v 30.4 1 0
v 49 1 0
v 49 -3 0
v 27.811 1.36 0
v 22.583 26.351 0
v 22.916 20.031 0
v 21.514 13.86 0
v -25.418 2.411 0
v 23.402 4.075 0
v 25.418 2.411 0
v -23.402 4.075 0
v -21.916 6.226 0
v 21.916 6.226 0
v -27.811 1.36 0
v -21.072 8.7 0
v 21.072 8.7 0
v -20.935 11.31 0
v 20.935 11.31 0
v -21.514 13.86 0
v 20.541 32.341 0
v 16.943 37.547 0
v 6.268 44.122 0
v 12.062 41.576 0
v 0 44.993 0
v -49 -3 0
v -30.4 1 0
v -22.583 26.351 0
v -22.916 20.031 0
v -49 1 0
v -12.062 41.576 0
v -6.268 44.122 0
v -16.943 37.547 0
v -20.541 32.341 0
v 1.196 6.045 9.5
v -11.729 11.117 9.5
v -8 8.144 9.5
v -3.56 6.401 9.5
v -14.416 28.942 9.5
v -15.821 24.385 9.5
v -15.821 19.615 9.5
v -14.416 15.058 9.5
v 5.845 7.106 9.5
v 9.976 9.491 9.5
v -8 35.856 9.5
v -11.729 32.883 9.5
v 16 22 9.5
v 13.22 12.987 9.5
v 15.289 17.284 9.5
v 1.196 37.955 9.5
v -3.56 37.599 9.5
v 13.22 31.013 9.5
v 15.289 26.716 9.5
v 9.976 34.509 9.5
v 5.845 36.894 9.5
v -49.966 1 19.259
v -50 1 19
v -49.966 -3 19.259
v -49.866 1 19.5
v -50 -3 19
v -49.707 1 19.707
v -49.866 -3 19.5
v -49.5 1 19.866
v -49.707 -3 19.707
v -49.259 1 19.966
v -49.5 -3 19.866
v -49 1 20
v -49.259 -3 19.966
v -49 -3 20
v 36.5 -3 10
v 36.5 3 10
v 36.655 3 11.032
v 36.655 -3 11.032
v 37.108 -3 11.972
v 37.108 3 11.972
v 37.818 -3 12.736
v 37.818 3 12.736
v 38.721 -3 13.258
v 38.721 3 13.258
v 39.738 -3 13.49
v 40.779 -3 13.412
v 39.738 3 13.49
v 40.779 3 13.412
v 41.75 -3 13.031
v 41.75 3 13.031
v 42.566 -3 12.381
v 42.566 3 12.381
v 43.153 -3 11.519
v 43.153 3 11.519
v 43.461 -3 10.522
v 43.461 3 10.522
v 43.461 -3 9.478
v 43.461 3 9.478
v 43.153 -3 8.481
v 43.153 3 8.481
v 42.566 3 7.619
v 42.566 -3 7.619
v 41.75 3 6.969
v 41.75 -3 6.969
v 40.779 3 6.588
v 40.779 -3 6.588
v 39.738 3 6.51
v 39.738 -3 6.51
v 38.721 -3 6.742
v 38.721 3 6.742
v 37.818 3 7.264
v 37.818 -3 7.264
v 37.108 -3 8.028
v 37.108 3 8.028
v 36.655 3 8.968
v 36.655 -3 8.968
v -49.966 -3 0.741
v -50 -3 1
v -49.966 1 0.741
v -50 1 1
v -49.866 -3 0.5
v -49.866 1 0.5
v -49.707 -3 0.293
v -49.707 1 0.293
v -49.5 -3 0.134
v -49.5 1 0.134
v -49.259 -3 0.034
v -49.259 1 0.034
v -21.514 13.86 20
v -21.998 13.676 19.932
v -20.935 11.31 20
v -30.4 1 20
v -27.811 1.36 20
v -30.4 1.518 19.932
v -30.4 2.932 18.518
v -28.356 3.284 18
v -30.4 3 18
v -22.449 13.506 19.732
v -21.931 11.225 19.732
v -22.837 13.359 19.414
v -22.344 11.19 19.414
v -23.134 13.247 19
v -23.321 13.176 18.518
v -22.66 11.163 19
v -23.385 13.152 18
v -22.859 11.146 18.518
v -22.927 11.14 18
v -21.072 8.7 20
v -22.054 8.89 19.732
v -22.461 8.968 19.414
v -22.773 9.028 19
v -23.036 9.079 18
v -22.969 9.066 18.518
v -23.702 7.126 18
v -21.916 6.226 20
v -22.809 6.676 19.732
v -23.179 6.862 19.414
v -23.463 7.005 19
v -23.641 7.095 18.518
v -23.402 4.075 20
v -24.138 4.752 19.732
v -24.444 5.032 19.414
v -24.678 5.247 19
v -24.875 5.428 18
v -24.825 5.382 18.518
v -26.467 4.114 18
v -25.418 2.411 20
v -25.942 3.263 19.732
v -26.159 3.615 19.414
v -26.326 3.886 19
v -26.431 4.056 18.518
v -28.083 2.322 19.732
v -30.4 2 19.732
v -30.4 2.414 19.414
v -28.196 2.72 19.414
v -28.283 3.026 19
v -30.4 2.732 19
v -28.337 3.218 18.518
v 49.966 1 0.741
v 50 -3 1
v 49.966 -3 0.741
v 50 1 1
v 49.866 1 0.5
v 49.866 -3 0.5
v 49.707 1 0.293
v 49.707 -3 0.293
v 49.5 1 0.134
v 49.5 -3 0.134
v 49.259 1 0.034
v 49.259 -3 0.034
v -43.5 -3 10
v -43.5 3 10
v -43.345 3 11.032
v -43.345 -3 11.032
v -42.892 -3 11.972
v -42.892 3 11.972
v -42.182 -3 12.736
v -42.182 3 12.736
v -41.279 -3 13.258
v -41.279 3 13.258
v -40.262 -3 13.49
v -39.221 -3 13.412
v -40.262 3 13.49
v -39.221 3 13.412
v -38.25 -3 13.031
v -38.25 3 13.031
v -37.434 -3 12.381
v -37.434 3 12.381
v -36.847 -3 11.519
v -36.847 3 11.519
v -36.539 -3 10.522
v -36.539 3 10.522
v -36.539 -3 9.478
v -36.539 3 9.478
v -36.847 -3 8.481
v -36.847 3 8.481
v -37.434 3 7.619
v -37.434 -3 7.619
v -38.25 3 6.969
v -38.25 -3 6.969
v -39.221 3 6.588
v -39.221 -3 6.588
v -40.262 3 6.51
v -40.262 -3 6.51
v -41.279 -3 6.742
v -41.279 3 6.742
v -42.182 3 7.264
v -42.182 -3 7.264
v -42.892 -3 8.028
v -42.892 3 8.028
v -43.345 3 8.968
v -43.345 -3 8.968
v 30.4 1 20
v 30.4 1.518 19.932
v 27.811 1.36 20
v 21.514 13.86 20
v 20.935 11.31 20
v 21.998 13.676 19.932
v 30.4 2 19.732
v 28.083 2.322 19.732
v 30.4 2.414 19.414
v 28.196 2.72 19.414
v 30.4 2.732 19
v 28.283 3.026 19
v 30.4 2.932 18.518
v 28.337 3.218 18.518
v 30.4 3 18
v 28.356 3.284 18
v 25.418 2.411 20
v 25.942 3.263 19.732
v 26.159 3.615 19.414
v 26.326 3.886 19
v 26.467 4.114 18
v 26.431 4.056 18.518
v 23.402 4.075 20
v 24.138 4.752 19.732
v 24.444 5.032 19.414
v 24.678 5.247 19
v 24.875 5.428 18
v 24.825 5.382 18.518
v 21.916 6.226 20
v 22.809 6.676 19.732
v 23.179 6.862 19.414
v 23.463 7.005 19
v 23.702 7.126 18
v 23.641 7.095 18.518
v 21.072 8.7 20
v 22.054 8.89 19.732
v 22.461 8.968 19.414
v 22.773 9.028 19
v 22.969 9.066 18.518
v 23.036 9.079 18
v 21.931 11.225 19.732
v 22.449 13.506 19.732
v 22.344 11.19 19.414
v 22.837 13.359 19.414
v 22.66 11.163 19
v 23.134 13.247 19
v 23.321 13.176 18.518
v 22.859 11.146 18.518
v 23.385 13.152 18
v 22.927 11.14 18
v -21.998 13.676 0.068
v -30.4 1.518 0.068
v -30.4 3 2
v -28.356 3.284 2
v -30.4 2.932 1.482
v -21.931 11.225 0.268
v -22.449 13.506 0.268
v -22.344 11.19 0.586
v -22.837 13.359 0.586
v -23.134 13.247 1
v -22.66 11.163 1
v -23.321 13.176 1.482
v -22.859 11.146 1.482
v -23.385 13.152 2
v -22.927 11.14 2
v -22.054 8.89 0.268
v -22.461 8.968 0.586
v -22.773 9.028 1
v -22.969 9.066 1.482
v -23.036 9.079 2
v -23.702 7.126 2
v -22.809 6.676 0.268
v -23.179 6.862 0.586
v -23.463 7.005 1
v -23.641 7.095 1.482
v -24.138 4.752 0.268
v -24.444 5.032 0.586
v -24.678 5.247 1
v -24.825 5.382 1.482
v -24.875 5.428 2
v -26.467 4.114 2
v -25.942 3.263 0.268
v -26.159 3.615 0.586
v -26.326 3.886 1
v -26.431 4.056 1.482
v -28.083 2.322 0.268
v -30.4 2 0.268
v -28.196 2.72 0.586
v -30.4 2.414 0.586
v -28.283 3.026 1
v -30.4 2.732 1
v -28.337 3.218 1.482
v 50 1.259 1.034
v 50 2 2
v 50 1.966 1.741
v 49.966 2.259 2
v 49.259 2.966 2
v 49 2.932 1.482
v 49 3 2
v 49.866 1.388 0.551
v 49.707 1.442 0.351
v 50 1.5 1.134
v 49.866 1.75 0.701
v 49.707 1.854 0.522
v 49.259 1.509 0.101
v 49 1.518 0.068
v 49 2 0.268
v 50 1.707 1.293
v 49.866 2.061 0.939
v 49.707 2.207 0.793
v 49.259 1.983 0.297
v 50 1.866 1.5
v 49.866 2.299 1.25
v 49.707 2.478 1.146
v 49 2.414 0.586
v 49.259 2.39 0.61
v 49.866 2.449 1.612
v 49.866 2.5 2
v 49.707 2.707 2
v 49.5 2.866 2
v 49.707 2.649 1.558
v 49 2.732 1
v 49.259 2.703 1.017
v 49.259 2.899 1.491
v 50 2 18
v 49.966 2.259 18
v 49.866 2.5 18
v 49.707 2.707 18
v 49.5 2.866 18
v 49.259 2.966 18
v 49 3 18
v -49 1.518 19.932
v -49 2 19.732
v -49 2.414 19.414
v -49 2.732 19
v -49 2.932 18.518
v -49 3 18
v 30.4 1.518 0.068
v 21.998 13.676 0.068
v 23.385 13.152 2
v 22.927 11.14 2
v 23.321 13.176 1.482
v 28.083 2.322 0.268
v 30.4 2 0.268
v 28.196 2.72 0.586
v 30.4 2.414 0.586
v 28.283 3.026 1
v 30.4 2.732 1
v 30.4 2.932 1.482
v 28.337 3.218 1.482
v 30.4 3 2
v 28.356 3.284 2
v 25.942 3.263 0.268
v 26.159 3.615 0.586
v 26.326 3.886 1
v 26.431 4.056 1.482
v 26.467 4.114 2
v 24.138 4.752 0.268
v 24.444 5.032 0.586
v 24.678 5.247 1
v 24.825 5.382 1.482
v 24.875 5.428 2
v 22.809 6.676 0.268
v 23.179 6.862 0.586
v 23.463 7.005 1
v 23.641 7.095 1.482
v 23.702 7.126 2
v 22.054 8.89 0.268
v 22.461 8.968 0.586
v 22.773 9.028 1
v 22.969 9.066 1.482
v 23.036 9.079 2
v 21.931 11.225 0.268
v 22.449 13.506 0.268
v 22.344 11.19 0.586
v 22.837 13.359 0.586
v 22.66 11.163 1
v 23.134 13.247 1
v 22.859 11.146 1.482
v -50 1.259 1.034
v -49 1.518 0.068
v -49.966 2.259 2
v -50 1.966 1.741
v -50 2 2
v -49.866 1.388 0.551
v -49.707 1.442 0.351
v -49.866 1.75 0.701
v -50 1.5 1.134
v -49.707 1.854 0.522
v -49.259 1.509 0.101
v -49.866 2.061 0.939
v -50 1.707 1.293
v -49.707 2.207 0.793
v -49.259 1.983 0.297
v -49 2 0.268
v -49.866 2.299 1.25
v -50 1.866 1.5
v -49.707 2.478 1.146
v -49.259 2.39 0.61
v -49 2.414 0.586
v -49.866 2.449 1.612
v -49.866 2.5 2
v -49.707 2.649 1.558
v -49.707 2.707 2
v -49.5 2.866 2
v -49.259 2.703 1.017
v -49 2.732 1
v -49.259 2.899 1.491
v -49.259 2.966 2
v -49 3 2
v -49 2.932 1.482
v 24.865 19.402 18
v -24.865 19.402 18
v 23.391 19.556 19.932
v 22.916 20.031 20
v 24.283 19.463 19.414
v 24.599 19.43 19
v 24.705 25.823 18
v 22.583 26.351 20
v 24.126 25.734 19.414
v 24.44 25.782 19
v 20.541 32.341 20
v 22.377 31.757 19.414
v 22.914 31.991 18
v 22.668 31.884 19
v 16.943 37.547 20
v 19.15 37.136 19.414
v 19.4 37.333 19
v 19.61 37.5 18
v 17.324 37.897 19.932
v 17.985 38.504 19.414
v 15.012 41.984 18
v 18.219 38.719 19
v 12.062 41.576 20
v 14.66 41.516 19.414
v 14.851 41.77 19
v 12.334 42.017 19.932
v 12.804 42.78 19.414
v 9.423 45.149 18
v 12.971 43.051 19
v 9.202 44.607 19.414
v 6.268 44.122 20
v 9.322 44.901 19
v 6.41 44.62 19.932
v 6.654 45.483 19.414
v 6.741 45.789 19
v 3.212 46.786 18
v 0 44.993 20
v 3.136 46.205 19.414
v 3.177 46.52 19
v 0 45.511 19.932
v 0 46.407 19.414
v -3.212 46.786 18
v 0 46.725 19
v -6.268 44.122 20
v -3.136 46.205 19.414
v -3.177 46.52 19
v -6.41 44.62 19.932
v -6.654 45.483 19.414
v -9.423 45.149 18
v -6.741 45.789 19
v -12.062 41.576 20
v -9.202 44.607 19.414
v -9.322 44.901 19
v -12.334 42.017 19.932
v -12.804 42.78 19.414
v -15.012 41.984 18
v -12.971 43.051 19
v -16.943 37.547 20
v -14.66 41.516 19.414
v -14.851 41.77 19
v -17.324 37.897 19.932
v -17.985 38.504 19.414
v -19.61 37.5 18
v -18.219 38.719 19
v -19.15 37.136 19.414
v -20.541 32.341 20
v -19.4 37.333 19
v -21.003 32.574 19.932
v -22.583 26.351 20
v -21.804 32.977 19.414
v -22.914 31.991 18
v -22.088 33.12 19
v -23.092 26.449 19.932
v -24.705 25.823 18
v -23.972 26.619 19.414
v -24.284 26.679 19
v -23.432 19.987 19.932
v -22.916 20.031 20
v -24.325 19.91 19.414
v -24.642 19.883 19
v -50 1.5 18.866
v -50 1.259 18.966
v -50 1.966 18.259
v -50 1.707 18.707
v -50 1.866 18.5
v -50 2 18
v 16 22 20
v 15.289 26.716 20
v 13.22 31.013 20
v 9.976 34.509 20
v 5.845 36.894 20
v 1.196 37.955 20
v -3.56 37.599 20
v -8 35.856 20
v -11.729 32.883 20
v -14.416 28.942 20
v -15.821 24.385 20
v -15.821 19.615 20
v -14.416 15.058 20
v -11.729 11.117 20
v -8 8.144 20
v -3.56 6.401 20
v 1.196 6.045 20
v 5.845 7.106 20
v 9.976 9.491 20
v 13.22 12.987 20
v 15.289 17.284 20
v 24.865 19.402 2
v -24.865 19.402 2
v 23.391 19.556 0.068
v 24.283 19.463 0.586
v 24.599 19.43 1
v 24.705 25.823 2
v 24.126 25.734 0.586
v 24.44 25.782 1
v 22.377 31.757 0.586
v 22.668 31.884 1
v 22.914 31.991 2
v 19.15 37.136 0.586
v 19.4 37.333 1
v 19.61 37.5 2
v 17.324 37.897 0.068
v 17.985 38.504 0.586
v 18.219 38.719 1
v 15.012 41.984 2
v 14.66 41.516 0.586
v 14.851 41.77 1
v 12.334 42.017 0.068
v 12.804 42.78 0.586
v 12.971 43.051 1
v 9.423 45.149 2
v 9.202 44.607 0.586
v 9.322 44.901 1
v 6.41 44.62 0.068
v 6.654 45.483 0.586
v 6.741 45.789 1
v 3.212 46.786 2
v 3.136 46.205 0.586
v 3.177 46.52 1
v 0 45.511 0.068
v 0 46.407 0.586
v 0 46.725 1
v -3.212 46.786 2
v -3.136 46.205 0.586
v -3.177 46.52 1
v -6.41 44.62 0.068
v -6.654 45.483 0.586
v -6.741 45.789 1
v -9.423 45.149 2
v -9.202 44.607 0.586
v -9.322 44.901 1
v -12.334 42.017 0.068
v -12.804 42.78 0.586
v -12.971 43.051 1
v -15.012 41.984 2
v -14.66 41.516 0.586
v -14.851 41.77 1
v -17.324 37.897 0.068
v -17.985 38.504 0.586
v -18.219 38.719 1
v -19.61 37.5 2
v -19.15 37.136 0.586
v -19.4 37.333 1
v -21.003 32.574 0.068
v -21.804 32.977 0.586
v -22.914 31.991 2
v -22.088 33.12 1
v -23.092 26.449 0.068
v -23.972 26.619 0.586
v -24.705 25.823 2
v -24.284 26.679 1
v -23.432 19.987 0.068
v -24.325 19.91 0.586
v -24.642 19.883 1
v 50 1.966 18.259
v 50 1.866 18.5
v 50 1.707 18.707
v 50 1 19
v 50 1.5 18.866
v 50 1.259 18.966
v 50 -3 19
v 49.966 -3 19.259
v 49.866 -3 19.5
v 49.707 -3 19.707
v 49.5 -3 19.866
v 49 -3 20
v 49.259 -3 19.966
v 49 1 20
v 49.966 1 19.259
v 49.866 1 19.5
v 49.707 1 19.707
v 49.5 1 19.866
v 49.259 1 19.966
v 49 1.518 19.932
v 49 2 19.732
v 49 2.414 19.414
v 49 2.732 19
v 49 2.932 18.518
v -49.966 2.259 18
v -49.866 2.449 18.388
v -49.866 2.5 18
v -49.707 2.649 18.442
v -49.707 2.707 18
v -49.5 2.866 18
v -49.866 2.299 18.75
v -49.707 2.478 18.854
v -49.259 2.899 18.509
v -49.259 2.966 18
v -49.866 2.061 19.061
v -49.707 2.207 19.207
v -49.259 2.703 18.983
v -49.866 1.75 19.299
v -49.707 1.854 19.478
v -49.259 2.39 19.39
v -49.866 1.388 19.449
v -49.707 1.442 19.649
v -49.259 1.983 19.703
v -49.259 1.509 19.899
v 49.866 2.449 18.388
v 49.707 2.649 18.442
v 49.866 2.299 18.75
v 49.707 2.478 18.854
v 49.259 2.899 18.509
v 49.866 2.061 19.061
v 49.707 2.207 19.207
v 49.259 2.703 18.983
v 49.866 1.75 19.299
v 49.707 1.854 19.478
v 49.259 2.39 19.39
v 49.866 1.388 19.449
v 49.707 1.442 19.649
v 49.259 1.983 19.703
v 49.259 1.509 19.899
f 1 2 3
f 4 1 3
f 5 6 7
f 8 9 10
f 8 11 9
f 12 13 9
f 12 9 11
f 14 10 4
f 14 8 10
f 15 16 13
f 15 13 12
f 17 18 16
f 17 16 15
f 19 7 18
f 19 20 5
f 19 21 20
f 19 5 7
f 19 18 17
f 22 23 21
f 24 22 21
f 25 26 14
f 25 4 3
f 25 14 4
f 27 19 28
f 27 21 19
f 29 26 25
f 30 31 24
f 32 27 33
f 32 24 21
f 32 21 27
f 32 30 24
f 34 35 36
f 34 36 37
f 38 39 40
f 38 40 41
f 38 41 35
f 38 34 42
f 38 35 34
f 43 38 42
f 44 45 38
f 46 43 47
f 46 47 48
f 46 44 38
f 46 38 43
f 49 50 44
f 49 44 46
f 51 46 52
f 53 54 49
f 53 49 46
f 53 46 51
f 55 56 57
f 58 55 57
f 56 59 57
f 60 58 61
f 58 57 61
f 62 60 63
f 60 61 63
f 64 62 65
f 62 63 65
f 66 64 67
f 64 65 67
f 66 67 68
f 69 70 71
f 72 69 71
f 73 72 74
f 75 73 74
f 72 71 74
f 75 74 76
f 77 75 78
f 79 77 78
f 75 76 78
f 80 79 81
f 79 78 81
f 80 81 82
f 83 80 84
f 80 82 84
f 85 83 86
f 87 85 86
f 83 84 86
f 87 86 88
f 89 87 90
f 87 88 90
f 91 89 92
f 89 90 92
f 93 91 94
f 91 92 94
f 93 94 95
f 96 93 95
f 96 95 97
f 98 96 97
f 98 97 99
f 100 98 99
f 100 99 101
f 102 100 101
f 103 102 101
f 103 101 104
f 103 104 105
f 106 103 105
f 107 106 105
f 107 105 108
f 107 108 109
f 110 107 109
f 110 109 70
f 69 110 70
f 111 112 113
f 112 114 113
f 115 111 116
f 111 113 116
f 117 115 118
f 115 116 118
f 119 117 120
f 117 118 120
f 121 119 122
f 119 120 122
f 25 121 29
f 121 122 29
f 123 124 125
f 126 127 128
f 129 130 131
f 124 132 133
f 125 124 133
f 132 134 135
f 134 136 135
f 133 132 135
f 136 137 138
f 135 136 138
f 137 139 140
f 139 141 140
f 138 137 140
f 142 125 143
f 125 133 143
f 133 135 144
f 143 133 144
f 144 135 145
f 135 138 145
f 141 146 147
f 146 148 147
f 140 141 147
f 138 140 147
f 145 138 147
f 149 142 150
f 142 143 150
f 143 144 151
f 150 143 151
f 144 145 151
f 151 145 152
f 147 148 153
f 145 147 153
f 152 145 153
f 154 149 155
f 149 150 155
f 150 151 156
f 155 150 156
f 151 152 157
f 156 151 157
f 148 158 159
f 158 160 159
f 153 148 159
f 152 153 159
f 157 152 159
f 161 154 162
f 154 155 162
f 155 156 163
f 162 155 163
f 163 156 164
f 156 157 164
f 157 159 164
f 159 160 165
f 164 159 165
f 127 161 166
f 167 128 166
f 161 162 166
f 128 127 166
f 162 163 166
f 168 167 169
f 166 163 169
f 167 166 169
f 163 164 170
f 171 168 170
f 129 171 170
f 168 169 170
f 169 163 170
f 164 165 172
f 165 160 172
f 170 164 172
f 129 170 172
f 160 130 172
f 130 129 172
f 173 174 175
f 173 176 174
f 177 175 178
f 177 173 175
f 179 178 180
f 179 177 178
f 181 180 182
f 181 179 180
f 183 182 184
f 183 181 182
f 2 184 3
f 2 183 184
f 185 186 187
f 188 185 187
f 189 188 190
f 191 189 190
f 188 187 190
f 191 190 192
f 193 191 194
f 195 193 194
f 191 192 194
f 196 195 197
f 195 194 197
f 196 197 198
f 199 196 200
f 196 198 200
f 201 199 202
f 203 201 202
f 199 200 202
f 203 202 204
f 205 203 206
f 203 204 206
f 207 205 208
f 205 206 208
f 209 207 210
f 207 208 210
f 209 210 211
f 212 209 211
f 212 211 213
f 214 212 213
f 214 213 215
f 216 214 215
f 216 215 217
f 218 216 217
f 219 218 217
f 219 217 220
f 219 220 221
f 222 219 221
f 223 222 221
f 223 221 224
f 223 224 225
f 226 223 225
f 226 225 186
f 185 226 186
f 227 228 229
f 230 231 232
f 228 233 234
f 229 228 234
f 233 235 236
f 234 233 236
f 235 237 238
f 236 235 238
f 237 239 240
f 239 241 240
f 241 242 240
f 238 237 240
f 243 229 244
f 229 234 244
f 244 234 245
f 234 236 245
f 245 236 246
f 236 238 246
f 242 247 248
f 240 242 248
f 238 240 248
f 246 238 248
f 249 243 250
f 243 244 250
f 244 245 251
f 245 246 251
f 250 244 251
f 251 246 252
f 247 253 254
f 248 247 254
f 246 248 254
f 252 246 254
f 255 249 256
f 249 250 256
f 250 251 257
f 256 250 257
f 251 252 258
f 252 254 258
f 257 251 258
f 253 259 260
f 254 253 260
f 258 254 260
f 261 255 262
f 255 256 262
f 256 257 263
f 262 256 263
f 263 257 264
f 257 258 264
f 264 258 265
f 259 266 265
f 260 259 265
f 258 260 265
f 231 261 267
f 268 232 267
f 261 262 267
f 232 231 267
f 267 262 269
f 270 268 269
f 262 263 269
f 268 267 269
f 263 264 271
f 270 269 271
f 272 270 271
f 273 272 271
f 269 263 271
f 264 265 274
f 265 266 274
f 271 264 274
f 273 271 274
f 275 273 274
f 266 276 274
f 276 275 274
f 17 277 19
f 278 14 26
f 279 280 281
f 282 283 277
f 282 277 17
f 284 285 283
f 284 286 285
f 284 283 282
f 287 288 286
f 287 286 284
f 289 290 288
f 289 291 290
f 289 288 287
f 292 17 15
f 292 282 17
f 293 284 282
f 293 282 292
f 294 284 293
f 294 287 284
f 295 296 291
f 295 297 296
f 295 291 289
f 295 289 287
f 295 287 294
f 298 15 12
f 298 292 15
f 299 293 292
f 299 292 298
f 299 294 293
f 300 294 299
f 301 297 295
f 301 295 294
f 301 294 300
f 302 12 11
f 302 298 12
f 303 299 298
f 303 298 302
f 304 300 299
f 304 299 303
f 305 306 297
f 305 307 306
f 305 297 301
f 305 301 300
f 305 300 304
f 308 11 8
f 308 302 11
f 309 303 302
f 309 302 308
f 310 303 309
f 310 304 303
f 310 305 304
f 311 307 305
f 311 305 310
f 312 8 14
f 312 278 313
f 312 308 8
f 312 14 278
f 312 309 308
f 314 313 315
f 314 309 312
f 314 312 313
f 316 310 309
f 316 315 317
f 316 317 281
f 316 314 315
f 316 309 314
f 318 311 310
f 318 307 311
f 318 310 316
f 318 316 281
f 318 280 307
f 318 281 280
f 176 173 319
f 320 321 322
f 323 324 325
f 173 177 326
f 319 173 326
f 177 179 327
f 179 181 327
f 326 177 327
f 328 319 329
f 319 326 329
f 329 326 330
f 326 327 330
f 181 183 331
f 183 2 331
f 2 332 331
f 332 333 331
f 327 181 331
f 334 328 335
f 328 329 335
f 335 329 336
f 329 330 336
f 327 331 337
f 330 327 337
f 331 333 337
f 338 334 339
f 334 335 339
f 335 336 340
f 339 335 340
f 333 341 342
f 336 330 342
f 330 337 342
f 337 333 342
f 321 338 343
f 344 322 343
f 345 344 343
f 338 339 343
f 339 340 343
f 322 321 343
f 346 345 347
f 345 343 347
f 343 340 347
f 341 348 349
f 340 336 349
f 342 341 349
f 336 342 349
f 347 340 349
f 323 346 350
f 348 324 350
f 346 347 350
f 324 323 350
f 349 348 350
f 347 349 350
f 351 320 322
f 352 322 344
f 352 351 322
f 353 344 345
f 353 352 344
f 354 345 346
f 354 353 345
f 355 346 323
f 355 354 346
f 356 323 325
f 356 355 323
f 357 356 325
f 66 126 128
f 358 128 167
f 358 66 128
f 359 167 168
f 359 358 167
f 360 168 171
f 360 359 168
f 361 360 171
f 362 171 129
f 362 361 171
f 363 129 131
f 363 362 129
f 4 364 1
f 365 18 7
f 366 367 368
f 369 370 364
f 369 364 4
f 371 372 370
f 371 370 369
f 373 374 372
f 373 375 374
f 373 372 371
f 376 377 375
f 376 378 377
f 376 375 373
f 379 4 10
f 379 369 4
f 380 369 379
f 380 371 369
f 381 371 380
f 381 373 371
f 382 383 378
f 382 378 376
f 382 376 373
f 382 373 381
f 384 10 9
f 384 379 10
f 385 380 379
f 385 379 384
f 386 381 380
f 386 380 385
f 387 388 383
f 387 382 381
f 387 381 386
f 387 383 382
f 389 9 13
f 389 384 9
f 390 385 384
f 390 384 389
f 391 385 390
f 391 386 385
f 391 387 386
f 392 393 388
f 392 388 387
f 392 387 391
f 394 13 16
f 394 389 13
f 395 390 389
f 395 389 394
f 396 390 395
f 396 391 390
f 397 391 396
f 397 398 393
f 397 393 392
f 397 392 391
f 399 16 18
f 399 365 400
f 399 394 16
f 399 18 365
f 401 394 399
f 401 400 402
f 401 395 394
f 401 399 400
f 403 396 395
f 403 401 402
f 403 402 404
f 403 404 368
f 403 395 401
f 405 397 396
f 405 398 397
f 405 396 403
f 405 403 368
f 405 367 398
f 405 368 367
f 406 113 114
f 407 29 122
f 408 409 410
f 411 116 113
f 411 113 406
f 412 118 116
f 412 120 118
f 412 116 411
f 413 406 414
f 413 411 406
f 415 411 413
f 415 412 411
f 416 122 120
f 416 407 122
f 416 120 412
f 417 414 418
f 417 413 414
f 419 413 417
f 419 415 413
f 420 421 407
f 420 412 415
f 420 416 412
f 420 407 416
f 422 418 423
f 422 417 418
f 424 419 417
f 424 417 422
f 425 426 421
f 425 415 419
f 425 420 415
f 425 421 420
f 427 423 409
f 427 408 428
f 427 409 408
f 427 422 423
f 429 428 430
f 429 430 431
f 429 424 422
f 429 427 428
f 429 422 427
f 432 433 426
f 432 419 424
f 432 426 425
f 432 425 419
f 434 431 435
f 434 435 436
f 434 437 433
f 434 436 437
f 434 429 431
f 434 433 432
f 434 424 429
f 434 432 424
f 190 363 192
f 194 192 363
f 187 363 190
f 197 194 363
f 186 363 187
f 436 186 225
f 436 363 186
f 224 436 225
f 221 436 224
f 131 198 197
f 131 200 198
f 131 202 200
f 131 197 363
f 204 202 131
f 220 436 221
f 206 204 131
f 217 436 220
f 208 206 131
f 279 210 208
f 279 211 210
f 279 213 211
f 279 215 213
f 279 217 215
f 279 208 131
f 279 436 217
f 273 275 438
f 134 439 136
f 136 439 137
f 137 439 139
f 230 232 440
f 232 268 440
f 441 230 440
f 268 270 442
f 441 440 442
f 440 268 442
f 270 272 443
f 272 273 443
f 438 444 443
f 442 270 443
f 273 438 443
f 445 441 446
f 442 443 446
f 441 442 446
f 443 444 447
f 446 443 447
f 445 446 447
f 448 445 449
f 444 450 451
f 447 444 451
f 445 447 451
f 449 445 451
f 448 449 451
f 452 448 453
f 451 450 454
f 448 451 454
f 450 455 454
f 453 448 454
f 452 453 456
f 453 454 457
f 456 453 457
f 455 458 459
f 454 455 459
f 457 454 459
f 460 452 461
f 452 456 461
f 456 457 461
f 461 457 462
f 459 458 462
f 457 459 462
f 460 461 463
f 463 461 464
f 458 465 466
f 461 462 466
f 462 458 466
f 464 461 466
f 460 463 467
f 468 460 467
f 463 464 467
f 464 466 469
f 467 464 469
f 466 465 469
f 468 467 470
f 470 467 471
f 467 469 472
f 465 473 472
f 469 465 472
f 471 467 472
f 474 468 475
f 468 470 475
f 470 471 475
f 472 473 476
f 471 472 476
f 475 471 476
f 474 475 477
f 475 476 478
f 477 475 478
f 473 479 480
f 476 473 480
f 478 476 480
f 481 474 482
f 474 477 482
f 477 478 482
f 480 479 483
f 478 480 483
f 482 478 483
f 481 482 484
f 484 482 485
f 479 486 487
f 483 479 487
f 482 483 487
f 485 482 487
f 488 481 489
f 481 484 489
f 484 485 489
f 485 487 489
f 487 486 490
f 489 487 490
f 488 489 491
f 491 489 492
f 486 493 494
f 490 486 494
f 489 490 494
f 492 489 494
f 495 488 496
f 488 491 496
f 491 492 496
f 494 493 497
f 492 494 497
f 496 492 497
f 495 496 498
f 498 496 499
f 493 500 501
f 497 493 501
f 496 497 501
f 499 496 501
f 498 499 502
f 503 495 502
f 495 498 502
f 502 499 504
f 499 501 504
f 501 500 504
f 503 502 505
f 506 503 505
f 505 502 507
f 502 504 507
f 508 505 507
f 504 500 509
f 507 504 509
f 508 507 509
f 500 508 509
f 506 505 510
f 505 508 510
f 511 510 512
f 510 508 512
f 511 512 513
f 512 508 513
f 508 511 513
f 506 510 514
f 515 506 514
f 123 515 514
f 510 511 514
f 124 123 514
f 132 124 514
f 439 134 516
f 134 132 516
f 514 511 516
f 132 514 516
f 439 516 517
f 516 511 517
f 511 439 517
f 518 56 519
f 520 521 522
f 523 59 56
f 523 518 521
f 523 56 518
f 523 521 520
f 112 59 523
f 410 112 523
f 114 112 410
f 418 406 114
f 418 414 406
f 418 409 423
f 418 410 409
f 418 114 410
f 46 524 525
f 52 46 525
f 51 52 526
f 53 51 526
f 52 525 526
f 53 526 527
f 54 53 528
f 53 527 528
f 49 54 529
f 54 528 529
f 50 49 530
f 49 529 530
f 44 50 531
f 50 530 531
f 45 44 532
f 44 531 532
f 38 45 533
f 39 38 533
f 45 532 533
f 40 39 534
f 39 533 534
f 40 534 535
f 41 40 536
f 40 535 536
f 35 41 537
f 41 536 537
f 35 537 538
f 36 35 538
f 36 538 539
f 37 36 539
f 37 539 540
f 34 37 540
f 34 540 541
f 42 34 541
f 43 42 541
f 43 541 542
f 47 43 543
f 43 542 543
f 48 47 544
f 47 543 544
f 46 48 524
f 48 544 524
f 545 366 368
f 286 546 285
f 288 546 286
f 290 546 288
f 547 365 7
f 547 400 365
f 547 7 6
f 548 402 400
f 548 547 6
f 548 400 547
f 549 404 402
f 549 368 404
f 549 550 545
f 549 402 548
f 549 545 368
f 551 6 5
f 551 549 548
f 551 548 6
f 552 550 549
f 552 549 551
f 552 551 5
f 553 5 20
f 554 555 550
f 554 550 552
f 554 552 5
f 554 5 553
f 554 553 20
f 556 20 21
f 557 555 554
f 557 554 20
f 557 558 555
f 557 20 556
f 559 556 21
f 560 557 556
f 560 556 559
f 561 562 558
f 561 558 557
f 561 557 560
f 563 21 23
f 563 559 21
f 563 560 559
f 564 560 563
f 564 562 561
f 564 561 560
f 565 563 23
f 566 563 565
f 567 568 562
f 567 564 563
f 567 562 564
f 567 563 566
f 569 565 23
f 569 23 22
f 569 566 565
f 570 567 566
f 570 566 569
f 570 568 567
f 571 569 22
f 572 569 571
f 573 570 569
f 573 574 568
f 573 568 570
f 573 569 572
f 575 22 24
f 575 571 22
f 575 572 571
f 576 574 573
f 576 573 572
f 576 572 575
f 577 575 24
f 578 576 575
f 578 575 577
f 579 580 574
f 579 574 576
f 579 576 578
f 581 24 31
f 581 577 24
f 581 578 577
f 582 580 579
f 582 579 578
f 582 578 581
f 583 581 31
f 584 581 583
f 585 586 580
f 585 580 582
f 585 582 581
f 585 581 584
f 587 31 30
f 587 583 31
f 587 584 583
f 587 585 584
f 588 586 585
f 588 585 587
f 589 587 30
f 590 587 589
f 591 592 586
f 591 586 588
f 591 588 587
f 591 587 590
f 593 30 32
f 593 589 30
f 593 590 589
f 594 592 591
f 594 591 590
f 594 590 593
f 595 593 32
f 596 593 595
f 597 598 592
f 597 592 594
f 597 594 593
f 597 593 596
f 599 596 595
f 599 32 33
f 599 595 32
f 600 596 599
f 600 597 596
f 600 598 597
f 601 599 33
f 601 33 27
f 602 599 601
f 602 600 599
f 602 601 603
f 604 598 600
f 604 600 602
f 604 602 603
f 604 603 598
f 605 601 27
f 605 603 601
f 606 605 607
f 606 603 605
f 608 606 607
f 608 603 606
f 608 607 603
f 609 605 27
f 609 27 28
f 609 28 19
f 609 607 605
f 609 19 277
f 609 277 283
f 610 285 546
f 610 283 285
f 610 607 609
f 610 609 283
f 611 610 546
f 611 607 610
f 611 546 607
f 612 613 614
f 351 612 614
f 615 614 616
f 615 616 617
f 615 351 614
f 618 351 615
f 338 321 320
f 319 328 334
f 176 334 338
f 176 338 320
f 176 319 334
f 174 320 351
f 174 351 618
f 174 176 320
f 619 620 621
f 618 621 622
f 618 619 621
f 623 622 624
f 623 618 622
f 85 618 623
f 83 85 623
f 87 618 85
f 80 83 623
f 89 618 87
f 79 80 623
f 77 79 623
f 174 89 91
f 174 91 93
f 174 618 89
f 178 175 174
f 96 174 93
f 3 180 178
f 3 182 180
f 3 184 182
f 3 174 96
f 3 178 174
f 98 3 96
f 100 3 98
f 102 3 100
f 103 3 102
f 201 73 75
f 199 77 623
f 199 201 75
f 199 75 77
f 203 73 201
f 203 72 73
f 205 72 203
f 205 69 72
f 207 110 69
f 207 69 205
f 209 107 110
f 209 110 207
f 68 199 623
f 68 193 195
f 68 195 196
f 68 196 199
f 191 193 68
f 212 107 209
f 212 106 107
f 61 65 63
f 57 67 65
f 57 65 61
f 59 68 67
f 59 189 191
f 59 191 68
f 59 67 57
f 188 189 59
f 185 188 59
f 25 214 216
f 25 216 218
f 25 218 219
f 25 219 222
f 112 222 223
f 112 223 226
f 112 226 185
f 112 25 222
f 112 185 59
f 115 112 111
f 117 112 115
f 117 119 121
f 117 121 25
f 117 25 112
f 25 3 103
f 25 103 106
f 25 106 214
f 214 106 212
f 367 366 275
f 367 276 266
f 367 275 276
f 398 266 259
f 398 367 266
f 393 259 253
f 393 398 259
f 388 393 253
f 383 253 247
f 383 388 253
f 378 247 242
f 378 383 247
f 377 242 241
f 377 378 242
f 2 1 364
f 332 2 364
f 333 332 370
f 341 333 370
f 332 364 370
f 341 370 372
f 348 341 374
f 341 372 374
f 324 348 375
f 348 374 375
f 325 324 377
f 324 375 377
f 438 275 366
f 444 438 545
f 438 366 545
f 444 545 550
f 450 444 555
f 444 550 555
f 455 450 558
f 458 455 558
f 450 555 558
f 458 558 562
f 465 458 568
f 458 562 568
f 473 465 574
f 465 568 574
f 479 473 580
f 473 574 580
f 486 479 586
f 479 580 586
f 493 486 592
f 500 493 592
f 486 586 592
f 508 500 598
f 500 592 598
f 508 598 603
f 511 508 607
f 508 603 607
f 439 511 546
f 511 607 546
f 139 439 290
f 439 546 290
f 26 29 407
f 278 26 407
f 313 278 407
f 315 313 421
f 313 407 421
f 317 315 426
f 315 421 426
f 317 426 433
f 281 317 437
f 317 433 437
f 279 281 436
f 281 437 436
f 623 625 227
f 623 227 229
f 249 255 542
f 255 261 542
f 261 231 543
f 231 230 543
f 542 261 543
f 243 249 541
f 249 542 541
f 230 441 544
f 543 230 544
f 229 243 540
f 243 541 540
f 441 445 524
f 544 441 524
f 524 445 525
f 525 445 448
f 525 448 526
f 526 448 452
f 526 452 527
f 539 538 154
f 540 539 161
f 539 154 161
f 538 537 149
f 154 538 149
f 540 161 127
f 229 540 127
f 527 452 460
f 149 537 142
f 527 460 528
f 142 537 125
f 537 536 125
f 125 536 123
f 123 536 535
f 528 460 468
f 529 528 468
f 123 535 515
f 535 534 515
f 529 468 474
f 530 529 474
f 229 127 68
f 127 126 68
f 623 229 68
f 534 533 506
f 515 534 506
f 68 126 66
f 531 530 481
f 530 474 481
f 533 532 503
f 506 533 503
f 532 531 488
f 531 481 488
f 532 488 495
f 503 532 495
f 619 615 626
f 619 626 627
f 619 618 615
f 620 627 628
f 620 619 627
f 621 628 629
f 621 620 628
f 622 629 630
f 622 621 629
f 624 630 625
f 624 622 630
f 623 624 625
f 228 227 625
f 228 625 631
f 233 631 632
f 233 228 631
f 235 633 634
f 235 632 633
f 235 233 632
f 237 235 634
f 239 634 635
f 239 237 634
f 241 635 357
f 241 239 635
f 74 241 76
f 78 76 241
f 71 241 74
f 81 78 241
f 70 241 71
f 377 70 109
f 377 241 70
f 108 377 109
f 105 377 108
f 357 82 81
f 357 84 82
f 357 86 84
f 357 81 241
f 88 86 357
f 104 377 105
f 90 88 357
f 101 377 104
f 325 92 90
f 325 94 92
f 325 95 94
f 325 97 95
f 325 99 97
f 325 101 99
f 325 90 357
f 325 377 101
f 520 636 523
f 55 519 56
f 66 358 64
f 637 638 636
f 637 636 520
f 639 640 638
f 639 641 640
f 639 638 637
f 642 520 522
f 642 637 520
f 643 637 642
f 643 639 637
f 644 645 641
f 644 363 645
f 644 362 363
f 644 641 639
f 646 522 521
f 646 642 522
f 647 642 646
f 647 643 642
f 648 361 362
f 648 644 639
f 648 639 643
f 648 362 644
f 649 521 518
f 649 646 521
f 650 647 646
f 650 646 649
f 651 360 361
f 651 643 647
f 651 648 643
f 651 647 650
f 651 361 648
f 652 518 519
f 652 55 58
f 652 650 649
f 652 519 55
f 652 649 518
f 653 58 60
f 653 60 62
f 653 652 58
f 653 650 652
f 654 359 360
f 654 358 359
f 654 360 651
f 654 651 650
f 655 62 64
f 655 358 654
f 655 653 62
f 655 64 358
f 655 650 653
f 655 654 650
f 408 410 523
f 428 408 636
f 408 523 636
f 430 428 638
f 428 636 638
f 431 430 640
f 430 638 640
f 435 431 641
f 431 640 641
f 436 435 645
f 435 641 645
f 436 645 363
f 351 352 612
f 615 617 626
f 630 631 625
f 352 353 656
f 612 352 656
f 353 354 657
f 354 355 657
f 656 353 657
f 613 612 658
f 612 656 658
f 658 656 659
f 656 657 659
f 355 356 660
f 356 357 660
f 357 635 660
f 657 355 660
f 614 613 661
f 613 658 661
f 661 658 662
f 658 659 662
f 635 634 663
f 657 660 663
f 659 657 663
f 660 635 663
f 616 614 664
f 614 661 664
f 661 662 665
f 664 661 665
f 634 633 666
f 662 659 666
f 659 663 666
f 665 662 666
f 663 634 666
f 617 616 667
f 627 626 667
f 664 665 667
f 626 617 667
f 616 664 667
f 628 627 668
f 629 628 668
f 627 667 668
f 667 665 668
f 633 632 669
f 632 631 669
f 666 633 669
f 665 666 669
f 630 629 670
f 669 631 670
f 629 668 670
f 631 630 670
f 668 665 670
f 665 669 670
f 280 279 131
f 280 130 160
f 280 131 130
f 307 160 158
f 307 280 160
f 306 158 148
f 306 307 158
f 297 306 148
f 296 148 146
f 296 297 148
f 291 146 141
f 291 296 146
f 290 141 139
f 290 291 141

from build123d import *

# Parameters (mm, degrees)
PAD_DEPTH       = 20
SKETCH001_R     = 16
POCKET_DEPTH    = 10.5
SKETCH002_R     = 3.5
POCKET001_DEPTH = 10
FILLET_R        = 2
FILLET001_R     = 2
FILLET002_R     = 1
FILLET003_R     = 1


with BuildPart() as part:
    # Sketch → Pad (new body)
    with BuildSketch(Plane.XY):
        with BuildLine():
            Line((-50, -3), (-50, 3))
            Line((-50, 3), (-30.4, 3))
            ThreePointArc((-30.4, 3), (-24.229838, 6.236305), (-23.384615, 13.15224))
            ThreePointArc((23.384615, 13.15224), (0, 46.993041), (-23.384615, 13.15224))
            ThreePointArc((23.384615, 13.15224), (24.229838, 6.236305), (30.4, 3))
            Line((30.4, 3), (50, 3))
            Line((50, 3), (50, -3))
            Line((50, -3), (-50, -3))
        make_face()
    extrude(amount=PAD_DEPTH)

    # Sketch001 (on Face10 of Pad) → Pocket (cut)
    with BuildSketch(Plane.XY.offset(20)):
        with Locations((0, 22)):
            Circle(SKETCH001_R)
    extrude(amount=-POCKET_DEPTH, mode=Mode.SUBTRACT)

    # Sketch002 (on Face10 of Pocket) → Pocket001 (cut)
    with BuildSketch(Plane(origin=(0, 3, 0), x_dir=(-1, 0, 0), z_dir=(0, 1, 0))):
        with Locations((-40, 10)):
            Circle(SKETCH002_R)
        with Locations((40, 10)):
            Circle(SKETCH002_R)
    extrude(amount=-POCKET001_DEPTH, mode=Mode.SUBTRACT)

    # Fillet
    fillet_edges = [part.edges().sort_by_distance(p)[0] for p in [
        (0, 46.993041, 20),
    ]]
    fillet(fillet_edges, radius=FILLET_R)

    # Fillet001
    fillet001_edges = [part.edges().sort_by_distance(p)[0] for p in [
        (0, 46.993041, 0),
    ]]
    fillet(fillet001_edges, radius=FILLET001_R)

    # Fillet002
    fillet002_edges = [part.edges().sort_by_distance(p)[0] for p in [
        (-50, 3, 10),
    ]]
    fillet(fillet002_edges, radius=FILLET002_R)

    # Fillet003
    fillet003_edges = [part.edges().sort_by_distance(p)[0] for p in [
        (50, 3, 10),
    ]]
    fillet(fillet003_edges, radius=FILLET003_R)


solid = part.part
